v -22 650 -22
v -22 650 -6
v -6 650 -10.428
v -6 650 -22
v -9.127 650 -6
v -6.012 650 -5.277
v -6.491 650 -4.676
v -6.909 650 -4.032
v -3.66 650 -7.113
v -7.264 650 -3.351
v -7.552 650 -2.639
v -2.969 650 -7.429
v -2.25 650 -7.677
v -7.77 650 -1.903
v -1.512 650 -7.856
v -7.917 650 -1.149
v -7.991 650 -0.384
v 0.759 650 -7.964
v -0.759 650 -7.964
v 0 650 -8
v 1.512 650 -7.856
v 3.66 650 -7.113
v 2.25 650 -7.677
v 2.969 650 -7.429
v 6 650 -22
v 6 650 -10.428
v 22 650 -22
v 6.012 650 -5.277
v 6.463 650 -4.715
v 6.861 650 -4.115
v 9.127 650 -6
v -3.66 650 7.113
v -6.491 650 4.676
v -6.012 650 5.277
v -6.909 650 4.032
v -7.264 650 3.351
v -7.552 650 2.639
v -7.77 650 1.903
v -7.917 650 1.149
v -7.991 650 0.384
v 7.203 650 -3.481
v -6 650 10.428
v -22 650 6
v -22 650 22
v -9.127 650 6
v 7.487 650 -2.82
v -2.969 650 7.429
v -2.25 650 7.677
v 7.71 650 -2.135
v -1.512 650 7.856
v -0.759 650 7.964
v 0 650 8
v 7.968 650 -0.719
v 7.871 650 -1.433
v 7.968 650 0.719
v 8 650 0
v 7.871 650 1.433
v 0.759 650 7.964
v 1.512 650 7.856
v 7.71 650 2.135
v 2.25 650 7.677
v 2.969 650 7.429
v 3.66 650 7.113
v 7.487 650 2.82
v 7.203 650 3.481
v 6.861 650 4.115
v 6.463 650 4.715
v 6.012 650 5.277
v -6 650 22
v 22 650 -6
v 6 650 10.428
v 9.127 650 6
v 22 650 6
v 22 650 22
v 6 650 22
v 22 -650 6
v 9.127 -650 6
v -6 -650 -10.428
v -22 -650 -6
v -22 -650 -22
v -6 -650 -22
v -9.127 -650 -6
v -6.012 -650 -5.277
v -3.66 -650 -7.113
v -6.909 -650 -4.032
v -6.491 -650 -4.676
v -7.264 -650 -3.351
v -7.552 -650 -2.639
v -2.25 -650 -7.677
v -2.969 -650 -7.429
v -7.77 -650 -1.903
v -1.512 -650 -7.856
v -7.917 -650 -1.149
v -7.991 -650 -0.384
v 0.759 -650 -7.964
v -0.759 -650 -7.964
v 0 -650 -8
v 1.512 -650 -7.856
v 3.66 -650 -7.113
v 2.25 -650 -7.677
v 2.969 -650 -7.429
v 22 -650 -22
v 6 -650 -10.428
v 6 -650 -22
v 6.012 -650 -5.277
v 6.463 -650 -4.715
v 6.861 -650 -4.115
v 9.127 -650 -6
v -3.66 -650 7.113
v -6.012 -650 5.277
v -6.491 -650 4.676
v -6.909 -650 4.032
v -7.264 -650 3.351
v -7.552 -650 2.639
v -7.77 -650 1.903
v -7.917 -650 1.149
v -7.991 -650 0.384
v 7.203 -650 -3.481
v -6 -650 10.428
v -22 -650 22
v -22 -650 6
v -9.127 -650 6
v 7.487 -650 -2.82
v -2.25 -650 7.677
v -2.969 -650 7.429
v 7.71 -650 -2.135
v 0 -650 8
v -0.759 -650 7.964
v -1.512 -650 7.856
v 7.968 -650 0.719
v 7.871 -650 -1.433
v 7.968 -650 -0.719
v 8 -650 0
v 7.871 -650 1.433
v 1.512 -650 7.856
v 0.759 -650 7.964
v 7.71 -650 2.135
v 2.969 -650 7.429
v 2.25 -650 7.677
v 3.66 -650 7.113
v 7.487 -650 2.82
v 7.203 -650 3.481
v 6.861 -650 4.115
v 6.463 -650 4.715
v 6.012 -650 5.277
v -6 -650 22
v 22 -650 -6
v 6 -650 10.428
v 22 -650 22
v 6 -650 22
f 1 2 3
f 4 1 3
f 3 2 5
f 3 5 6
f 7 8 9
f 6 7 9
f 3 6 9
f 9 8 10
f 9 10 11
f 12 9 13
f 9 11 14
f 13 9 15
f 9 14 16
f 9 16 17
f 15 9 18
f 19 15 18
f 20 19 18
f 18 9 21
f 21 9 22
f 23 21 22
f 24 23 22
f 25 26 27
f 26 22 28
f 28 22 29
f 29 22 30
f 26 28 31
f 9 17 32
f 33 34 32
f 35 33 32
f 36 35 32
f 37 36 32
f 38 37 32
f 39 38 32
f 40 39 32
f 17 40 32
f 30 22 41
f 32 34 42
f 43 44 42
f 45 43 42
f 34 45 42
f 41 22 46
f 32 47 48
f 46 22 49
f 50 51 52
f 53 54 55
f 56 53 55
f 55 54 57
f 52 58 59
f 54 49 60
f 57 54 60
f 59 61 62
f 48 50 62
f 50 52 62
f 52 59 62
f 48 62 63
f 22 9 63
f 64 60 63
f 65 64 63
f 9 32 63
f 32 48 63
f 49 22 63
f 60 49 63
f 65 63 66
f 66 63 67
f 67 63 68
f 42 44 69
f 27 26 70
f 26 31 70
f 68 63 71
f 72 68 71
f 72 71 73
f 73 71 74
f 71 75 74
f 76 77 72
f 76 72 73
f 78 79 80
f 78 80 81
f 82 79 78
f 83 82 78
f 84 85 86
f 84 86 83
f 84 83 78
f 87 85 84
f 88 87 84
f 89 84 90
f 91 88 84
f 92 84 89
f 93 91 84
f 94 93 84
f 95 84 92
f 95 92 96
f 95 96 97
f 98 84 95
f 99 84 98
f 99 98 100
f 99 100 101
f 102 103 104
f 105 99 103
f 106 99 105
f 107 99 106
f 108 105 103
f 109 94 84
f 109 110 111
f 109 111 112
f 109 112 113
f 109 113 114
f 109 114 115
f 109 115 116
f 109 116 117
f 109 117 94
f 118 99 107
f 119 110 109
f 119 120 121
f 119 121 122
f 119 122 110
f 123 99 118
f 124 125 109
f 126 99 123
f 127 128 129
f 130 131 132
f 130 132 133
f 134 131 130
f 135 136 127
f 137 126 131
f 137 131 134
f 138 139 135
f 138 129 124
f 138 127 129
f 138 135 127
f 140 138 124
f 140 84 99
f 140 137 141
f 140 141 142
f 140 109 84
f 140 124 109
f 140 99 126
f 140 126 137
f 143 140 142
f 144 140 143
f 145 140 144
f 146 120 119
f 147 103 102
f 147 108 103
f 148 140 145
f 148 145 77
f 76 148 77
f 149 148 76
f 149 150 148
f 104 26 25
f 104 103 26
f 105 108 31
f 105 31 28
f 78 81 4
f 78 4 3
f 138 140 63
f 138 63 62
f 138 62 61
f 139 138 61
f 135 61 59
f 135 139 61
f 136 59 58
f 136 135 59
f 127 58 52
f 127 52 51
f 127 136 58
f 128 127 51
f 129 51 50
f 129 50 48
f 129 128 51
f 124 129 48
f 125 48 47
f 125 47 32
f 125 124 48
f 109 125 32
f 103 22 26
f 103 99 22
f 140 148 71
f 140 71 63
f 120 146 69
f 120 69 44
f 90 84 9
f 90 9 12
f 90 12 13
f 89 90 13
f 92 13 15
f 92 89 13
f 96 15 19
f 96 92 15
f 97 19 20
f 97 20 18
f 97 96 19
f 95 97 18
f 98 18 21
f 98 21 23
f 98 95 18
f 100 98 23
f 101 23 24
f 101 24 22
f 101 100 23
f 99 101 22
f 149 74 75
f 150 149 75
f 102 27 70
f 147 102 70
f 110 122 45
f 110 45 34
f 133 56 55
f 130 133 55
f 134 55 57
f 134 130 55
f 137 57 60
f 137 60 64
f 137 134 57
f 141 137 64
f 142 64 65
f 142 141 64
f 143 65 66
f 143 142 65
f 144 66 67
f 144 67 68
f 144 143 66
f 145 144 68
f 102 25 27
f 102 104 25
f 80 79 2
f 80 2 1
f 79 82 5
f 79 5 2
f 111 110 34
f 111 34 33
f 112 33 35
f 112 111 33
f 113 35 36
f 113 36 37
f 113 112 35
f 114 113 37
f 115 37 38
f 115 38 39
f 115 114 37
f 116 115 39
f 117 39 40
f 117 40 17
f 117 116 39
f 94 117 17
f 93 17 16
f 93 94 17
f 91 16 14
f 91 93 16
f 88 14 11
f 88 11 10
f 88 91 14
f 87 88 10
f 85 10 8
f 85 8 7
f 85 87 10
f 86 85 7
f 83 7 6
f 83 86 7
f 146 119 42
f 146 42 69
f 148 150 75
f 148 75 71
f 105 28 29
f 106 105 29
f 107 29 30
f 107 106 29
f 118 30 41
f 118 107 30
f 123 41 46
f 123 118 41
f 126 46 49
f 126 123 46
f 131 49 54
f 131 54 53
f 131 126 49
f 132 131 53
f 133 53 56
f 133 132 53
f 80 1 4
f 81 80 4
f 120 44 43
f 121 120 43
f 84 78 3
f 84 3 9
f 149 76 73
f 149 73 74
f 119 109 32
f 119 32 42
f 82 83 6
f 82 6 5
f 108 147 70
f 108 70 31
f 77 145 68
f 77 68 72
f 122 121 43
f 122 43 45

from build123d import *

# Parameters (mm, degrees)
F1_DEPTH = 650


with BuildPart() as f1:
    # F0 (on Front) → F1 (new body, symmetric)
    with BuildSketch(Plane.XZ):
        with BuildLine():
            Line((6, -22), (22, -22))
            Line((22, -22), (22, -6))
            Line((22, -6), (9.127227, -6))
            Line((9.127227, -6), (6.012498, -5.277298))
            ThreePointArc((6.012498, -5.277298), (4.92284, -6.306001), (3.660452, -7.113444))
            Line((3.660452, -7.113444), (6, -10.428497))
            Line((6, -10.428497), (6, -22))
        make_face()
        with BuildLine():
            ThreePointArc((-3.660452, -7.113444), (0, -8), (3.660452, -7.113444))
            ThreePointArc((3.660452, -7.113444), (4.92284, -6.306001), (6.012498, -5.277298))
            ThreePointArc((6.012498, -5.277298), (7.486654, -2.819576), (8, 0))
            ThreePointArc((8, 0), (7.486654, 2.819576), (6.012498, 5.277298))
            ThreePointArc((6.012498, 5.277298), (4.92284, 6.306001), (3.660452, 7.113444))
            ThreePointArc((3.660452, 7.113444), (0, 8), (-3.660452, 7.113444))
            ThreePointArc((-3.660452, 7.113444), (-4.92284, 6.306001), (-6.012498, 5.277298))
            ThreePointArc((-6.012498, 5.277298), (-8, 0), (-6.012498, -5.277298))
            ThreePointArc((-6.012498, -5.277298), (-4.92284, -6.306001), (-3.660452, -7.113444))
        make_face()
        with BuildLine():
            Line((-6, -10.428497), (-3.660452, -7.113444))
            ThreePointArc((-3.660452, -7.113444), (-4.92284, -6.306001), (-6.012498, -5.277298))
            Line((-6.012498, -5.277298), (-9.127227, -6))
            Line((-9.127227, -6), (-22, -6))
            Line((-22, -6), (-22, -22))
            Line((-22, -22), (-6, -22))
            Line((-6, -22), (-6, -10.428497))
        make_face()
        with BuildLine():
            ThreePointArc((3.660452, 7.113444), (4.92284, 6.306001), (6.012498, 5.277298))
            Line((6.012498, 5.277298), (9.127227, 6))
            Line((9.127227, 6), (22, 6))
            Line((22, 6), (22, 22))
            Line((22, 22), (6, 22))
            Line((6, 22), (6, 10.428497))
            Line((6, 10.428497), (3.660452, 7.113444))
        make_face()
        with BuildLine():
            Line((-9.127227, 6), (-6.012498, 5.277298))
            ThreePointArc((-6.012498, 5.277298), (-4.92284, 6.306001), (-3.660452, 7.113444))
            Line((-3.660452, 7.113444), (-6, 10.428497))
            Line((-6, 10.428497), (-6, 22))
            Line((-6, 22), (-22, 22))
            Line((-22, 22), (-22, 6))
            Line((-22, 6), (-9.127227, 6))
        make_face()
    extrude(amount=F1_DEPTH, both=True)


solid = f1.part
